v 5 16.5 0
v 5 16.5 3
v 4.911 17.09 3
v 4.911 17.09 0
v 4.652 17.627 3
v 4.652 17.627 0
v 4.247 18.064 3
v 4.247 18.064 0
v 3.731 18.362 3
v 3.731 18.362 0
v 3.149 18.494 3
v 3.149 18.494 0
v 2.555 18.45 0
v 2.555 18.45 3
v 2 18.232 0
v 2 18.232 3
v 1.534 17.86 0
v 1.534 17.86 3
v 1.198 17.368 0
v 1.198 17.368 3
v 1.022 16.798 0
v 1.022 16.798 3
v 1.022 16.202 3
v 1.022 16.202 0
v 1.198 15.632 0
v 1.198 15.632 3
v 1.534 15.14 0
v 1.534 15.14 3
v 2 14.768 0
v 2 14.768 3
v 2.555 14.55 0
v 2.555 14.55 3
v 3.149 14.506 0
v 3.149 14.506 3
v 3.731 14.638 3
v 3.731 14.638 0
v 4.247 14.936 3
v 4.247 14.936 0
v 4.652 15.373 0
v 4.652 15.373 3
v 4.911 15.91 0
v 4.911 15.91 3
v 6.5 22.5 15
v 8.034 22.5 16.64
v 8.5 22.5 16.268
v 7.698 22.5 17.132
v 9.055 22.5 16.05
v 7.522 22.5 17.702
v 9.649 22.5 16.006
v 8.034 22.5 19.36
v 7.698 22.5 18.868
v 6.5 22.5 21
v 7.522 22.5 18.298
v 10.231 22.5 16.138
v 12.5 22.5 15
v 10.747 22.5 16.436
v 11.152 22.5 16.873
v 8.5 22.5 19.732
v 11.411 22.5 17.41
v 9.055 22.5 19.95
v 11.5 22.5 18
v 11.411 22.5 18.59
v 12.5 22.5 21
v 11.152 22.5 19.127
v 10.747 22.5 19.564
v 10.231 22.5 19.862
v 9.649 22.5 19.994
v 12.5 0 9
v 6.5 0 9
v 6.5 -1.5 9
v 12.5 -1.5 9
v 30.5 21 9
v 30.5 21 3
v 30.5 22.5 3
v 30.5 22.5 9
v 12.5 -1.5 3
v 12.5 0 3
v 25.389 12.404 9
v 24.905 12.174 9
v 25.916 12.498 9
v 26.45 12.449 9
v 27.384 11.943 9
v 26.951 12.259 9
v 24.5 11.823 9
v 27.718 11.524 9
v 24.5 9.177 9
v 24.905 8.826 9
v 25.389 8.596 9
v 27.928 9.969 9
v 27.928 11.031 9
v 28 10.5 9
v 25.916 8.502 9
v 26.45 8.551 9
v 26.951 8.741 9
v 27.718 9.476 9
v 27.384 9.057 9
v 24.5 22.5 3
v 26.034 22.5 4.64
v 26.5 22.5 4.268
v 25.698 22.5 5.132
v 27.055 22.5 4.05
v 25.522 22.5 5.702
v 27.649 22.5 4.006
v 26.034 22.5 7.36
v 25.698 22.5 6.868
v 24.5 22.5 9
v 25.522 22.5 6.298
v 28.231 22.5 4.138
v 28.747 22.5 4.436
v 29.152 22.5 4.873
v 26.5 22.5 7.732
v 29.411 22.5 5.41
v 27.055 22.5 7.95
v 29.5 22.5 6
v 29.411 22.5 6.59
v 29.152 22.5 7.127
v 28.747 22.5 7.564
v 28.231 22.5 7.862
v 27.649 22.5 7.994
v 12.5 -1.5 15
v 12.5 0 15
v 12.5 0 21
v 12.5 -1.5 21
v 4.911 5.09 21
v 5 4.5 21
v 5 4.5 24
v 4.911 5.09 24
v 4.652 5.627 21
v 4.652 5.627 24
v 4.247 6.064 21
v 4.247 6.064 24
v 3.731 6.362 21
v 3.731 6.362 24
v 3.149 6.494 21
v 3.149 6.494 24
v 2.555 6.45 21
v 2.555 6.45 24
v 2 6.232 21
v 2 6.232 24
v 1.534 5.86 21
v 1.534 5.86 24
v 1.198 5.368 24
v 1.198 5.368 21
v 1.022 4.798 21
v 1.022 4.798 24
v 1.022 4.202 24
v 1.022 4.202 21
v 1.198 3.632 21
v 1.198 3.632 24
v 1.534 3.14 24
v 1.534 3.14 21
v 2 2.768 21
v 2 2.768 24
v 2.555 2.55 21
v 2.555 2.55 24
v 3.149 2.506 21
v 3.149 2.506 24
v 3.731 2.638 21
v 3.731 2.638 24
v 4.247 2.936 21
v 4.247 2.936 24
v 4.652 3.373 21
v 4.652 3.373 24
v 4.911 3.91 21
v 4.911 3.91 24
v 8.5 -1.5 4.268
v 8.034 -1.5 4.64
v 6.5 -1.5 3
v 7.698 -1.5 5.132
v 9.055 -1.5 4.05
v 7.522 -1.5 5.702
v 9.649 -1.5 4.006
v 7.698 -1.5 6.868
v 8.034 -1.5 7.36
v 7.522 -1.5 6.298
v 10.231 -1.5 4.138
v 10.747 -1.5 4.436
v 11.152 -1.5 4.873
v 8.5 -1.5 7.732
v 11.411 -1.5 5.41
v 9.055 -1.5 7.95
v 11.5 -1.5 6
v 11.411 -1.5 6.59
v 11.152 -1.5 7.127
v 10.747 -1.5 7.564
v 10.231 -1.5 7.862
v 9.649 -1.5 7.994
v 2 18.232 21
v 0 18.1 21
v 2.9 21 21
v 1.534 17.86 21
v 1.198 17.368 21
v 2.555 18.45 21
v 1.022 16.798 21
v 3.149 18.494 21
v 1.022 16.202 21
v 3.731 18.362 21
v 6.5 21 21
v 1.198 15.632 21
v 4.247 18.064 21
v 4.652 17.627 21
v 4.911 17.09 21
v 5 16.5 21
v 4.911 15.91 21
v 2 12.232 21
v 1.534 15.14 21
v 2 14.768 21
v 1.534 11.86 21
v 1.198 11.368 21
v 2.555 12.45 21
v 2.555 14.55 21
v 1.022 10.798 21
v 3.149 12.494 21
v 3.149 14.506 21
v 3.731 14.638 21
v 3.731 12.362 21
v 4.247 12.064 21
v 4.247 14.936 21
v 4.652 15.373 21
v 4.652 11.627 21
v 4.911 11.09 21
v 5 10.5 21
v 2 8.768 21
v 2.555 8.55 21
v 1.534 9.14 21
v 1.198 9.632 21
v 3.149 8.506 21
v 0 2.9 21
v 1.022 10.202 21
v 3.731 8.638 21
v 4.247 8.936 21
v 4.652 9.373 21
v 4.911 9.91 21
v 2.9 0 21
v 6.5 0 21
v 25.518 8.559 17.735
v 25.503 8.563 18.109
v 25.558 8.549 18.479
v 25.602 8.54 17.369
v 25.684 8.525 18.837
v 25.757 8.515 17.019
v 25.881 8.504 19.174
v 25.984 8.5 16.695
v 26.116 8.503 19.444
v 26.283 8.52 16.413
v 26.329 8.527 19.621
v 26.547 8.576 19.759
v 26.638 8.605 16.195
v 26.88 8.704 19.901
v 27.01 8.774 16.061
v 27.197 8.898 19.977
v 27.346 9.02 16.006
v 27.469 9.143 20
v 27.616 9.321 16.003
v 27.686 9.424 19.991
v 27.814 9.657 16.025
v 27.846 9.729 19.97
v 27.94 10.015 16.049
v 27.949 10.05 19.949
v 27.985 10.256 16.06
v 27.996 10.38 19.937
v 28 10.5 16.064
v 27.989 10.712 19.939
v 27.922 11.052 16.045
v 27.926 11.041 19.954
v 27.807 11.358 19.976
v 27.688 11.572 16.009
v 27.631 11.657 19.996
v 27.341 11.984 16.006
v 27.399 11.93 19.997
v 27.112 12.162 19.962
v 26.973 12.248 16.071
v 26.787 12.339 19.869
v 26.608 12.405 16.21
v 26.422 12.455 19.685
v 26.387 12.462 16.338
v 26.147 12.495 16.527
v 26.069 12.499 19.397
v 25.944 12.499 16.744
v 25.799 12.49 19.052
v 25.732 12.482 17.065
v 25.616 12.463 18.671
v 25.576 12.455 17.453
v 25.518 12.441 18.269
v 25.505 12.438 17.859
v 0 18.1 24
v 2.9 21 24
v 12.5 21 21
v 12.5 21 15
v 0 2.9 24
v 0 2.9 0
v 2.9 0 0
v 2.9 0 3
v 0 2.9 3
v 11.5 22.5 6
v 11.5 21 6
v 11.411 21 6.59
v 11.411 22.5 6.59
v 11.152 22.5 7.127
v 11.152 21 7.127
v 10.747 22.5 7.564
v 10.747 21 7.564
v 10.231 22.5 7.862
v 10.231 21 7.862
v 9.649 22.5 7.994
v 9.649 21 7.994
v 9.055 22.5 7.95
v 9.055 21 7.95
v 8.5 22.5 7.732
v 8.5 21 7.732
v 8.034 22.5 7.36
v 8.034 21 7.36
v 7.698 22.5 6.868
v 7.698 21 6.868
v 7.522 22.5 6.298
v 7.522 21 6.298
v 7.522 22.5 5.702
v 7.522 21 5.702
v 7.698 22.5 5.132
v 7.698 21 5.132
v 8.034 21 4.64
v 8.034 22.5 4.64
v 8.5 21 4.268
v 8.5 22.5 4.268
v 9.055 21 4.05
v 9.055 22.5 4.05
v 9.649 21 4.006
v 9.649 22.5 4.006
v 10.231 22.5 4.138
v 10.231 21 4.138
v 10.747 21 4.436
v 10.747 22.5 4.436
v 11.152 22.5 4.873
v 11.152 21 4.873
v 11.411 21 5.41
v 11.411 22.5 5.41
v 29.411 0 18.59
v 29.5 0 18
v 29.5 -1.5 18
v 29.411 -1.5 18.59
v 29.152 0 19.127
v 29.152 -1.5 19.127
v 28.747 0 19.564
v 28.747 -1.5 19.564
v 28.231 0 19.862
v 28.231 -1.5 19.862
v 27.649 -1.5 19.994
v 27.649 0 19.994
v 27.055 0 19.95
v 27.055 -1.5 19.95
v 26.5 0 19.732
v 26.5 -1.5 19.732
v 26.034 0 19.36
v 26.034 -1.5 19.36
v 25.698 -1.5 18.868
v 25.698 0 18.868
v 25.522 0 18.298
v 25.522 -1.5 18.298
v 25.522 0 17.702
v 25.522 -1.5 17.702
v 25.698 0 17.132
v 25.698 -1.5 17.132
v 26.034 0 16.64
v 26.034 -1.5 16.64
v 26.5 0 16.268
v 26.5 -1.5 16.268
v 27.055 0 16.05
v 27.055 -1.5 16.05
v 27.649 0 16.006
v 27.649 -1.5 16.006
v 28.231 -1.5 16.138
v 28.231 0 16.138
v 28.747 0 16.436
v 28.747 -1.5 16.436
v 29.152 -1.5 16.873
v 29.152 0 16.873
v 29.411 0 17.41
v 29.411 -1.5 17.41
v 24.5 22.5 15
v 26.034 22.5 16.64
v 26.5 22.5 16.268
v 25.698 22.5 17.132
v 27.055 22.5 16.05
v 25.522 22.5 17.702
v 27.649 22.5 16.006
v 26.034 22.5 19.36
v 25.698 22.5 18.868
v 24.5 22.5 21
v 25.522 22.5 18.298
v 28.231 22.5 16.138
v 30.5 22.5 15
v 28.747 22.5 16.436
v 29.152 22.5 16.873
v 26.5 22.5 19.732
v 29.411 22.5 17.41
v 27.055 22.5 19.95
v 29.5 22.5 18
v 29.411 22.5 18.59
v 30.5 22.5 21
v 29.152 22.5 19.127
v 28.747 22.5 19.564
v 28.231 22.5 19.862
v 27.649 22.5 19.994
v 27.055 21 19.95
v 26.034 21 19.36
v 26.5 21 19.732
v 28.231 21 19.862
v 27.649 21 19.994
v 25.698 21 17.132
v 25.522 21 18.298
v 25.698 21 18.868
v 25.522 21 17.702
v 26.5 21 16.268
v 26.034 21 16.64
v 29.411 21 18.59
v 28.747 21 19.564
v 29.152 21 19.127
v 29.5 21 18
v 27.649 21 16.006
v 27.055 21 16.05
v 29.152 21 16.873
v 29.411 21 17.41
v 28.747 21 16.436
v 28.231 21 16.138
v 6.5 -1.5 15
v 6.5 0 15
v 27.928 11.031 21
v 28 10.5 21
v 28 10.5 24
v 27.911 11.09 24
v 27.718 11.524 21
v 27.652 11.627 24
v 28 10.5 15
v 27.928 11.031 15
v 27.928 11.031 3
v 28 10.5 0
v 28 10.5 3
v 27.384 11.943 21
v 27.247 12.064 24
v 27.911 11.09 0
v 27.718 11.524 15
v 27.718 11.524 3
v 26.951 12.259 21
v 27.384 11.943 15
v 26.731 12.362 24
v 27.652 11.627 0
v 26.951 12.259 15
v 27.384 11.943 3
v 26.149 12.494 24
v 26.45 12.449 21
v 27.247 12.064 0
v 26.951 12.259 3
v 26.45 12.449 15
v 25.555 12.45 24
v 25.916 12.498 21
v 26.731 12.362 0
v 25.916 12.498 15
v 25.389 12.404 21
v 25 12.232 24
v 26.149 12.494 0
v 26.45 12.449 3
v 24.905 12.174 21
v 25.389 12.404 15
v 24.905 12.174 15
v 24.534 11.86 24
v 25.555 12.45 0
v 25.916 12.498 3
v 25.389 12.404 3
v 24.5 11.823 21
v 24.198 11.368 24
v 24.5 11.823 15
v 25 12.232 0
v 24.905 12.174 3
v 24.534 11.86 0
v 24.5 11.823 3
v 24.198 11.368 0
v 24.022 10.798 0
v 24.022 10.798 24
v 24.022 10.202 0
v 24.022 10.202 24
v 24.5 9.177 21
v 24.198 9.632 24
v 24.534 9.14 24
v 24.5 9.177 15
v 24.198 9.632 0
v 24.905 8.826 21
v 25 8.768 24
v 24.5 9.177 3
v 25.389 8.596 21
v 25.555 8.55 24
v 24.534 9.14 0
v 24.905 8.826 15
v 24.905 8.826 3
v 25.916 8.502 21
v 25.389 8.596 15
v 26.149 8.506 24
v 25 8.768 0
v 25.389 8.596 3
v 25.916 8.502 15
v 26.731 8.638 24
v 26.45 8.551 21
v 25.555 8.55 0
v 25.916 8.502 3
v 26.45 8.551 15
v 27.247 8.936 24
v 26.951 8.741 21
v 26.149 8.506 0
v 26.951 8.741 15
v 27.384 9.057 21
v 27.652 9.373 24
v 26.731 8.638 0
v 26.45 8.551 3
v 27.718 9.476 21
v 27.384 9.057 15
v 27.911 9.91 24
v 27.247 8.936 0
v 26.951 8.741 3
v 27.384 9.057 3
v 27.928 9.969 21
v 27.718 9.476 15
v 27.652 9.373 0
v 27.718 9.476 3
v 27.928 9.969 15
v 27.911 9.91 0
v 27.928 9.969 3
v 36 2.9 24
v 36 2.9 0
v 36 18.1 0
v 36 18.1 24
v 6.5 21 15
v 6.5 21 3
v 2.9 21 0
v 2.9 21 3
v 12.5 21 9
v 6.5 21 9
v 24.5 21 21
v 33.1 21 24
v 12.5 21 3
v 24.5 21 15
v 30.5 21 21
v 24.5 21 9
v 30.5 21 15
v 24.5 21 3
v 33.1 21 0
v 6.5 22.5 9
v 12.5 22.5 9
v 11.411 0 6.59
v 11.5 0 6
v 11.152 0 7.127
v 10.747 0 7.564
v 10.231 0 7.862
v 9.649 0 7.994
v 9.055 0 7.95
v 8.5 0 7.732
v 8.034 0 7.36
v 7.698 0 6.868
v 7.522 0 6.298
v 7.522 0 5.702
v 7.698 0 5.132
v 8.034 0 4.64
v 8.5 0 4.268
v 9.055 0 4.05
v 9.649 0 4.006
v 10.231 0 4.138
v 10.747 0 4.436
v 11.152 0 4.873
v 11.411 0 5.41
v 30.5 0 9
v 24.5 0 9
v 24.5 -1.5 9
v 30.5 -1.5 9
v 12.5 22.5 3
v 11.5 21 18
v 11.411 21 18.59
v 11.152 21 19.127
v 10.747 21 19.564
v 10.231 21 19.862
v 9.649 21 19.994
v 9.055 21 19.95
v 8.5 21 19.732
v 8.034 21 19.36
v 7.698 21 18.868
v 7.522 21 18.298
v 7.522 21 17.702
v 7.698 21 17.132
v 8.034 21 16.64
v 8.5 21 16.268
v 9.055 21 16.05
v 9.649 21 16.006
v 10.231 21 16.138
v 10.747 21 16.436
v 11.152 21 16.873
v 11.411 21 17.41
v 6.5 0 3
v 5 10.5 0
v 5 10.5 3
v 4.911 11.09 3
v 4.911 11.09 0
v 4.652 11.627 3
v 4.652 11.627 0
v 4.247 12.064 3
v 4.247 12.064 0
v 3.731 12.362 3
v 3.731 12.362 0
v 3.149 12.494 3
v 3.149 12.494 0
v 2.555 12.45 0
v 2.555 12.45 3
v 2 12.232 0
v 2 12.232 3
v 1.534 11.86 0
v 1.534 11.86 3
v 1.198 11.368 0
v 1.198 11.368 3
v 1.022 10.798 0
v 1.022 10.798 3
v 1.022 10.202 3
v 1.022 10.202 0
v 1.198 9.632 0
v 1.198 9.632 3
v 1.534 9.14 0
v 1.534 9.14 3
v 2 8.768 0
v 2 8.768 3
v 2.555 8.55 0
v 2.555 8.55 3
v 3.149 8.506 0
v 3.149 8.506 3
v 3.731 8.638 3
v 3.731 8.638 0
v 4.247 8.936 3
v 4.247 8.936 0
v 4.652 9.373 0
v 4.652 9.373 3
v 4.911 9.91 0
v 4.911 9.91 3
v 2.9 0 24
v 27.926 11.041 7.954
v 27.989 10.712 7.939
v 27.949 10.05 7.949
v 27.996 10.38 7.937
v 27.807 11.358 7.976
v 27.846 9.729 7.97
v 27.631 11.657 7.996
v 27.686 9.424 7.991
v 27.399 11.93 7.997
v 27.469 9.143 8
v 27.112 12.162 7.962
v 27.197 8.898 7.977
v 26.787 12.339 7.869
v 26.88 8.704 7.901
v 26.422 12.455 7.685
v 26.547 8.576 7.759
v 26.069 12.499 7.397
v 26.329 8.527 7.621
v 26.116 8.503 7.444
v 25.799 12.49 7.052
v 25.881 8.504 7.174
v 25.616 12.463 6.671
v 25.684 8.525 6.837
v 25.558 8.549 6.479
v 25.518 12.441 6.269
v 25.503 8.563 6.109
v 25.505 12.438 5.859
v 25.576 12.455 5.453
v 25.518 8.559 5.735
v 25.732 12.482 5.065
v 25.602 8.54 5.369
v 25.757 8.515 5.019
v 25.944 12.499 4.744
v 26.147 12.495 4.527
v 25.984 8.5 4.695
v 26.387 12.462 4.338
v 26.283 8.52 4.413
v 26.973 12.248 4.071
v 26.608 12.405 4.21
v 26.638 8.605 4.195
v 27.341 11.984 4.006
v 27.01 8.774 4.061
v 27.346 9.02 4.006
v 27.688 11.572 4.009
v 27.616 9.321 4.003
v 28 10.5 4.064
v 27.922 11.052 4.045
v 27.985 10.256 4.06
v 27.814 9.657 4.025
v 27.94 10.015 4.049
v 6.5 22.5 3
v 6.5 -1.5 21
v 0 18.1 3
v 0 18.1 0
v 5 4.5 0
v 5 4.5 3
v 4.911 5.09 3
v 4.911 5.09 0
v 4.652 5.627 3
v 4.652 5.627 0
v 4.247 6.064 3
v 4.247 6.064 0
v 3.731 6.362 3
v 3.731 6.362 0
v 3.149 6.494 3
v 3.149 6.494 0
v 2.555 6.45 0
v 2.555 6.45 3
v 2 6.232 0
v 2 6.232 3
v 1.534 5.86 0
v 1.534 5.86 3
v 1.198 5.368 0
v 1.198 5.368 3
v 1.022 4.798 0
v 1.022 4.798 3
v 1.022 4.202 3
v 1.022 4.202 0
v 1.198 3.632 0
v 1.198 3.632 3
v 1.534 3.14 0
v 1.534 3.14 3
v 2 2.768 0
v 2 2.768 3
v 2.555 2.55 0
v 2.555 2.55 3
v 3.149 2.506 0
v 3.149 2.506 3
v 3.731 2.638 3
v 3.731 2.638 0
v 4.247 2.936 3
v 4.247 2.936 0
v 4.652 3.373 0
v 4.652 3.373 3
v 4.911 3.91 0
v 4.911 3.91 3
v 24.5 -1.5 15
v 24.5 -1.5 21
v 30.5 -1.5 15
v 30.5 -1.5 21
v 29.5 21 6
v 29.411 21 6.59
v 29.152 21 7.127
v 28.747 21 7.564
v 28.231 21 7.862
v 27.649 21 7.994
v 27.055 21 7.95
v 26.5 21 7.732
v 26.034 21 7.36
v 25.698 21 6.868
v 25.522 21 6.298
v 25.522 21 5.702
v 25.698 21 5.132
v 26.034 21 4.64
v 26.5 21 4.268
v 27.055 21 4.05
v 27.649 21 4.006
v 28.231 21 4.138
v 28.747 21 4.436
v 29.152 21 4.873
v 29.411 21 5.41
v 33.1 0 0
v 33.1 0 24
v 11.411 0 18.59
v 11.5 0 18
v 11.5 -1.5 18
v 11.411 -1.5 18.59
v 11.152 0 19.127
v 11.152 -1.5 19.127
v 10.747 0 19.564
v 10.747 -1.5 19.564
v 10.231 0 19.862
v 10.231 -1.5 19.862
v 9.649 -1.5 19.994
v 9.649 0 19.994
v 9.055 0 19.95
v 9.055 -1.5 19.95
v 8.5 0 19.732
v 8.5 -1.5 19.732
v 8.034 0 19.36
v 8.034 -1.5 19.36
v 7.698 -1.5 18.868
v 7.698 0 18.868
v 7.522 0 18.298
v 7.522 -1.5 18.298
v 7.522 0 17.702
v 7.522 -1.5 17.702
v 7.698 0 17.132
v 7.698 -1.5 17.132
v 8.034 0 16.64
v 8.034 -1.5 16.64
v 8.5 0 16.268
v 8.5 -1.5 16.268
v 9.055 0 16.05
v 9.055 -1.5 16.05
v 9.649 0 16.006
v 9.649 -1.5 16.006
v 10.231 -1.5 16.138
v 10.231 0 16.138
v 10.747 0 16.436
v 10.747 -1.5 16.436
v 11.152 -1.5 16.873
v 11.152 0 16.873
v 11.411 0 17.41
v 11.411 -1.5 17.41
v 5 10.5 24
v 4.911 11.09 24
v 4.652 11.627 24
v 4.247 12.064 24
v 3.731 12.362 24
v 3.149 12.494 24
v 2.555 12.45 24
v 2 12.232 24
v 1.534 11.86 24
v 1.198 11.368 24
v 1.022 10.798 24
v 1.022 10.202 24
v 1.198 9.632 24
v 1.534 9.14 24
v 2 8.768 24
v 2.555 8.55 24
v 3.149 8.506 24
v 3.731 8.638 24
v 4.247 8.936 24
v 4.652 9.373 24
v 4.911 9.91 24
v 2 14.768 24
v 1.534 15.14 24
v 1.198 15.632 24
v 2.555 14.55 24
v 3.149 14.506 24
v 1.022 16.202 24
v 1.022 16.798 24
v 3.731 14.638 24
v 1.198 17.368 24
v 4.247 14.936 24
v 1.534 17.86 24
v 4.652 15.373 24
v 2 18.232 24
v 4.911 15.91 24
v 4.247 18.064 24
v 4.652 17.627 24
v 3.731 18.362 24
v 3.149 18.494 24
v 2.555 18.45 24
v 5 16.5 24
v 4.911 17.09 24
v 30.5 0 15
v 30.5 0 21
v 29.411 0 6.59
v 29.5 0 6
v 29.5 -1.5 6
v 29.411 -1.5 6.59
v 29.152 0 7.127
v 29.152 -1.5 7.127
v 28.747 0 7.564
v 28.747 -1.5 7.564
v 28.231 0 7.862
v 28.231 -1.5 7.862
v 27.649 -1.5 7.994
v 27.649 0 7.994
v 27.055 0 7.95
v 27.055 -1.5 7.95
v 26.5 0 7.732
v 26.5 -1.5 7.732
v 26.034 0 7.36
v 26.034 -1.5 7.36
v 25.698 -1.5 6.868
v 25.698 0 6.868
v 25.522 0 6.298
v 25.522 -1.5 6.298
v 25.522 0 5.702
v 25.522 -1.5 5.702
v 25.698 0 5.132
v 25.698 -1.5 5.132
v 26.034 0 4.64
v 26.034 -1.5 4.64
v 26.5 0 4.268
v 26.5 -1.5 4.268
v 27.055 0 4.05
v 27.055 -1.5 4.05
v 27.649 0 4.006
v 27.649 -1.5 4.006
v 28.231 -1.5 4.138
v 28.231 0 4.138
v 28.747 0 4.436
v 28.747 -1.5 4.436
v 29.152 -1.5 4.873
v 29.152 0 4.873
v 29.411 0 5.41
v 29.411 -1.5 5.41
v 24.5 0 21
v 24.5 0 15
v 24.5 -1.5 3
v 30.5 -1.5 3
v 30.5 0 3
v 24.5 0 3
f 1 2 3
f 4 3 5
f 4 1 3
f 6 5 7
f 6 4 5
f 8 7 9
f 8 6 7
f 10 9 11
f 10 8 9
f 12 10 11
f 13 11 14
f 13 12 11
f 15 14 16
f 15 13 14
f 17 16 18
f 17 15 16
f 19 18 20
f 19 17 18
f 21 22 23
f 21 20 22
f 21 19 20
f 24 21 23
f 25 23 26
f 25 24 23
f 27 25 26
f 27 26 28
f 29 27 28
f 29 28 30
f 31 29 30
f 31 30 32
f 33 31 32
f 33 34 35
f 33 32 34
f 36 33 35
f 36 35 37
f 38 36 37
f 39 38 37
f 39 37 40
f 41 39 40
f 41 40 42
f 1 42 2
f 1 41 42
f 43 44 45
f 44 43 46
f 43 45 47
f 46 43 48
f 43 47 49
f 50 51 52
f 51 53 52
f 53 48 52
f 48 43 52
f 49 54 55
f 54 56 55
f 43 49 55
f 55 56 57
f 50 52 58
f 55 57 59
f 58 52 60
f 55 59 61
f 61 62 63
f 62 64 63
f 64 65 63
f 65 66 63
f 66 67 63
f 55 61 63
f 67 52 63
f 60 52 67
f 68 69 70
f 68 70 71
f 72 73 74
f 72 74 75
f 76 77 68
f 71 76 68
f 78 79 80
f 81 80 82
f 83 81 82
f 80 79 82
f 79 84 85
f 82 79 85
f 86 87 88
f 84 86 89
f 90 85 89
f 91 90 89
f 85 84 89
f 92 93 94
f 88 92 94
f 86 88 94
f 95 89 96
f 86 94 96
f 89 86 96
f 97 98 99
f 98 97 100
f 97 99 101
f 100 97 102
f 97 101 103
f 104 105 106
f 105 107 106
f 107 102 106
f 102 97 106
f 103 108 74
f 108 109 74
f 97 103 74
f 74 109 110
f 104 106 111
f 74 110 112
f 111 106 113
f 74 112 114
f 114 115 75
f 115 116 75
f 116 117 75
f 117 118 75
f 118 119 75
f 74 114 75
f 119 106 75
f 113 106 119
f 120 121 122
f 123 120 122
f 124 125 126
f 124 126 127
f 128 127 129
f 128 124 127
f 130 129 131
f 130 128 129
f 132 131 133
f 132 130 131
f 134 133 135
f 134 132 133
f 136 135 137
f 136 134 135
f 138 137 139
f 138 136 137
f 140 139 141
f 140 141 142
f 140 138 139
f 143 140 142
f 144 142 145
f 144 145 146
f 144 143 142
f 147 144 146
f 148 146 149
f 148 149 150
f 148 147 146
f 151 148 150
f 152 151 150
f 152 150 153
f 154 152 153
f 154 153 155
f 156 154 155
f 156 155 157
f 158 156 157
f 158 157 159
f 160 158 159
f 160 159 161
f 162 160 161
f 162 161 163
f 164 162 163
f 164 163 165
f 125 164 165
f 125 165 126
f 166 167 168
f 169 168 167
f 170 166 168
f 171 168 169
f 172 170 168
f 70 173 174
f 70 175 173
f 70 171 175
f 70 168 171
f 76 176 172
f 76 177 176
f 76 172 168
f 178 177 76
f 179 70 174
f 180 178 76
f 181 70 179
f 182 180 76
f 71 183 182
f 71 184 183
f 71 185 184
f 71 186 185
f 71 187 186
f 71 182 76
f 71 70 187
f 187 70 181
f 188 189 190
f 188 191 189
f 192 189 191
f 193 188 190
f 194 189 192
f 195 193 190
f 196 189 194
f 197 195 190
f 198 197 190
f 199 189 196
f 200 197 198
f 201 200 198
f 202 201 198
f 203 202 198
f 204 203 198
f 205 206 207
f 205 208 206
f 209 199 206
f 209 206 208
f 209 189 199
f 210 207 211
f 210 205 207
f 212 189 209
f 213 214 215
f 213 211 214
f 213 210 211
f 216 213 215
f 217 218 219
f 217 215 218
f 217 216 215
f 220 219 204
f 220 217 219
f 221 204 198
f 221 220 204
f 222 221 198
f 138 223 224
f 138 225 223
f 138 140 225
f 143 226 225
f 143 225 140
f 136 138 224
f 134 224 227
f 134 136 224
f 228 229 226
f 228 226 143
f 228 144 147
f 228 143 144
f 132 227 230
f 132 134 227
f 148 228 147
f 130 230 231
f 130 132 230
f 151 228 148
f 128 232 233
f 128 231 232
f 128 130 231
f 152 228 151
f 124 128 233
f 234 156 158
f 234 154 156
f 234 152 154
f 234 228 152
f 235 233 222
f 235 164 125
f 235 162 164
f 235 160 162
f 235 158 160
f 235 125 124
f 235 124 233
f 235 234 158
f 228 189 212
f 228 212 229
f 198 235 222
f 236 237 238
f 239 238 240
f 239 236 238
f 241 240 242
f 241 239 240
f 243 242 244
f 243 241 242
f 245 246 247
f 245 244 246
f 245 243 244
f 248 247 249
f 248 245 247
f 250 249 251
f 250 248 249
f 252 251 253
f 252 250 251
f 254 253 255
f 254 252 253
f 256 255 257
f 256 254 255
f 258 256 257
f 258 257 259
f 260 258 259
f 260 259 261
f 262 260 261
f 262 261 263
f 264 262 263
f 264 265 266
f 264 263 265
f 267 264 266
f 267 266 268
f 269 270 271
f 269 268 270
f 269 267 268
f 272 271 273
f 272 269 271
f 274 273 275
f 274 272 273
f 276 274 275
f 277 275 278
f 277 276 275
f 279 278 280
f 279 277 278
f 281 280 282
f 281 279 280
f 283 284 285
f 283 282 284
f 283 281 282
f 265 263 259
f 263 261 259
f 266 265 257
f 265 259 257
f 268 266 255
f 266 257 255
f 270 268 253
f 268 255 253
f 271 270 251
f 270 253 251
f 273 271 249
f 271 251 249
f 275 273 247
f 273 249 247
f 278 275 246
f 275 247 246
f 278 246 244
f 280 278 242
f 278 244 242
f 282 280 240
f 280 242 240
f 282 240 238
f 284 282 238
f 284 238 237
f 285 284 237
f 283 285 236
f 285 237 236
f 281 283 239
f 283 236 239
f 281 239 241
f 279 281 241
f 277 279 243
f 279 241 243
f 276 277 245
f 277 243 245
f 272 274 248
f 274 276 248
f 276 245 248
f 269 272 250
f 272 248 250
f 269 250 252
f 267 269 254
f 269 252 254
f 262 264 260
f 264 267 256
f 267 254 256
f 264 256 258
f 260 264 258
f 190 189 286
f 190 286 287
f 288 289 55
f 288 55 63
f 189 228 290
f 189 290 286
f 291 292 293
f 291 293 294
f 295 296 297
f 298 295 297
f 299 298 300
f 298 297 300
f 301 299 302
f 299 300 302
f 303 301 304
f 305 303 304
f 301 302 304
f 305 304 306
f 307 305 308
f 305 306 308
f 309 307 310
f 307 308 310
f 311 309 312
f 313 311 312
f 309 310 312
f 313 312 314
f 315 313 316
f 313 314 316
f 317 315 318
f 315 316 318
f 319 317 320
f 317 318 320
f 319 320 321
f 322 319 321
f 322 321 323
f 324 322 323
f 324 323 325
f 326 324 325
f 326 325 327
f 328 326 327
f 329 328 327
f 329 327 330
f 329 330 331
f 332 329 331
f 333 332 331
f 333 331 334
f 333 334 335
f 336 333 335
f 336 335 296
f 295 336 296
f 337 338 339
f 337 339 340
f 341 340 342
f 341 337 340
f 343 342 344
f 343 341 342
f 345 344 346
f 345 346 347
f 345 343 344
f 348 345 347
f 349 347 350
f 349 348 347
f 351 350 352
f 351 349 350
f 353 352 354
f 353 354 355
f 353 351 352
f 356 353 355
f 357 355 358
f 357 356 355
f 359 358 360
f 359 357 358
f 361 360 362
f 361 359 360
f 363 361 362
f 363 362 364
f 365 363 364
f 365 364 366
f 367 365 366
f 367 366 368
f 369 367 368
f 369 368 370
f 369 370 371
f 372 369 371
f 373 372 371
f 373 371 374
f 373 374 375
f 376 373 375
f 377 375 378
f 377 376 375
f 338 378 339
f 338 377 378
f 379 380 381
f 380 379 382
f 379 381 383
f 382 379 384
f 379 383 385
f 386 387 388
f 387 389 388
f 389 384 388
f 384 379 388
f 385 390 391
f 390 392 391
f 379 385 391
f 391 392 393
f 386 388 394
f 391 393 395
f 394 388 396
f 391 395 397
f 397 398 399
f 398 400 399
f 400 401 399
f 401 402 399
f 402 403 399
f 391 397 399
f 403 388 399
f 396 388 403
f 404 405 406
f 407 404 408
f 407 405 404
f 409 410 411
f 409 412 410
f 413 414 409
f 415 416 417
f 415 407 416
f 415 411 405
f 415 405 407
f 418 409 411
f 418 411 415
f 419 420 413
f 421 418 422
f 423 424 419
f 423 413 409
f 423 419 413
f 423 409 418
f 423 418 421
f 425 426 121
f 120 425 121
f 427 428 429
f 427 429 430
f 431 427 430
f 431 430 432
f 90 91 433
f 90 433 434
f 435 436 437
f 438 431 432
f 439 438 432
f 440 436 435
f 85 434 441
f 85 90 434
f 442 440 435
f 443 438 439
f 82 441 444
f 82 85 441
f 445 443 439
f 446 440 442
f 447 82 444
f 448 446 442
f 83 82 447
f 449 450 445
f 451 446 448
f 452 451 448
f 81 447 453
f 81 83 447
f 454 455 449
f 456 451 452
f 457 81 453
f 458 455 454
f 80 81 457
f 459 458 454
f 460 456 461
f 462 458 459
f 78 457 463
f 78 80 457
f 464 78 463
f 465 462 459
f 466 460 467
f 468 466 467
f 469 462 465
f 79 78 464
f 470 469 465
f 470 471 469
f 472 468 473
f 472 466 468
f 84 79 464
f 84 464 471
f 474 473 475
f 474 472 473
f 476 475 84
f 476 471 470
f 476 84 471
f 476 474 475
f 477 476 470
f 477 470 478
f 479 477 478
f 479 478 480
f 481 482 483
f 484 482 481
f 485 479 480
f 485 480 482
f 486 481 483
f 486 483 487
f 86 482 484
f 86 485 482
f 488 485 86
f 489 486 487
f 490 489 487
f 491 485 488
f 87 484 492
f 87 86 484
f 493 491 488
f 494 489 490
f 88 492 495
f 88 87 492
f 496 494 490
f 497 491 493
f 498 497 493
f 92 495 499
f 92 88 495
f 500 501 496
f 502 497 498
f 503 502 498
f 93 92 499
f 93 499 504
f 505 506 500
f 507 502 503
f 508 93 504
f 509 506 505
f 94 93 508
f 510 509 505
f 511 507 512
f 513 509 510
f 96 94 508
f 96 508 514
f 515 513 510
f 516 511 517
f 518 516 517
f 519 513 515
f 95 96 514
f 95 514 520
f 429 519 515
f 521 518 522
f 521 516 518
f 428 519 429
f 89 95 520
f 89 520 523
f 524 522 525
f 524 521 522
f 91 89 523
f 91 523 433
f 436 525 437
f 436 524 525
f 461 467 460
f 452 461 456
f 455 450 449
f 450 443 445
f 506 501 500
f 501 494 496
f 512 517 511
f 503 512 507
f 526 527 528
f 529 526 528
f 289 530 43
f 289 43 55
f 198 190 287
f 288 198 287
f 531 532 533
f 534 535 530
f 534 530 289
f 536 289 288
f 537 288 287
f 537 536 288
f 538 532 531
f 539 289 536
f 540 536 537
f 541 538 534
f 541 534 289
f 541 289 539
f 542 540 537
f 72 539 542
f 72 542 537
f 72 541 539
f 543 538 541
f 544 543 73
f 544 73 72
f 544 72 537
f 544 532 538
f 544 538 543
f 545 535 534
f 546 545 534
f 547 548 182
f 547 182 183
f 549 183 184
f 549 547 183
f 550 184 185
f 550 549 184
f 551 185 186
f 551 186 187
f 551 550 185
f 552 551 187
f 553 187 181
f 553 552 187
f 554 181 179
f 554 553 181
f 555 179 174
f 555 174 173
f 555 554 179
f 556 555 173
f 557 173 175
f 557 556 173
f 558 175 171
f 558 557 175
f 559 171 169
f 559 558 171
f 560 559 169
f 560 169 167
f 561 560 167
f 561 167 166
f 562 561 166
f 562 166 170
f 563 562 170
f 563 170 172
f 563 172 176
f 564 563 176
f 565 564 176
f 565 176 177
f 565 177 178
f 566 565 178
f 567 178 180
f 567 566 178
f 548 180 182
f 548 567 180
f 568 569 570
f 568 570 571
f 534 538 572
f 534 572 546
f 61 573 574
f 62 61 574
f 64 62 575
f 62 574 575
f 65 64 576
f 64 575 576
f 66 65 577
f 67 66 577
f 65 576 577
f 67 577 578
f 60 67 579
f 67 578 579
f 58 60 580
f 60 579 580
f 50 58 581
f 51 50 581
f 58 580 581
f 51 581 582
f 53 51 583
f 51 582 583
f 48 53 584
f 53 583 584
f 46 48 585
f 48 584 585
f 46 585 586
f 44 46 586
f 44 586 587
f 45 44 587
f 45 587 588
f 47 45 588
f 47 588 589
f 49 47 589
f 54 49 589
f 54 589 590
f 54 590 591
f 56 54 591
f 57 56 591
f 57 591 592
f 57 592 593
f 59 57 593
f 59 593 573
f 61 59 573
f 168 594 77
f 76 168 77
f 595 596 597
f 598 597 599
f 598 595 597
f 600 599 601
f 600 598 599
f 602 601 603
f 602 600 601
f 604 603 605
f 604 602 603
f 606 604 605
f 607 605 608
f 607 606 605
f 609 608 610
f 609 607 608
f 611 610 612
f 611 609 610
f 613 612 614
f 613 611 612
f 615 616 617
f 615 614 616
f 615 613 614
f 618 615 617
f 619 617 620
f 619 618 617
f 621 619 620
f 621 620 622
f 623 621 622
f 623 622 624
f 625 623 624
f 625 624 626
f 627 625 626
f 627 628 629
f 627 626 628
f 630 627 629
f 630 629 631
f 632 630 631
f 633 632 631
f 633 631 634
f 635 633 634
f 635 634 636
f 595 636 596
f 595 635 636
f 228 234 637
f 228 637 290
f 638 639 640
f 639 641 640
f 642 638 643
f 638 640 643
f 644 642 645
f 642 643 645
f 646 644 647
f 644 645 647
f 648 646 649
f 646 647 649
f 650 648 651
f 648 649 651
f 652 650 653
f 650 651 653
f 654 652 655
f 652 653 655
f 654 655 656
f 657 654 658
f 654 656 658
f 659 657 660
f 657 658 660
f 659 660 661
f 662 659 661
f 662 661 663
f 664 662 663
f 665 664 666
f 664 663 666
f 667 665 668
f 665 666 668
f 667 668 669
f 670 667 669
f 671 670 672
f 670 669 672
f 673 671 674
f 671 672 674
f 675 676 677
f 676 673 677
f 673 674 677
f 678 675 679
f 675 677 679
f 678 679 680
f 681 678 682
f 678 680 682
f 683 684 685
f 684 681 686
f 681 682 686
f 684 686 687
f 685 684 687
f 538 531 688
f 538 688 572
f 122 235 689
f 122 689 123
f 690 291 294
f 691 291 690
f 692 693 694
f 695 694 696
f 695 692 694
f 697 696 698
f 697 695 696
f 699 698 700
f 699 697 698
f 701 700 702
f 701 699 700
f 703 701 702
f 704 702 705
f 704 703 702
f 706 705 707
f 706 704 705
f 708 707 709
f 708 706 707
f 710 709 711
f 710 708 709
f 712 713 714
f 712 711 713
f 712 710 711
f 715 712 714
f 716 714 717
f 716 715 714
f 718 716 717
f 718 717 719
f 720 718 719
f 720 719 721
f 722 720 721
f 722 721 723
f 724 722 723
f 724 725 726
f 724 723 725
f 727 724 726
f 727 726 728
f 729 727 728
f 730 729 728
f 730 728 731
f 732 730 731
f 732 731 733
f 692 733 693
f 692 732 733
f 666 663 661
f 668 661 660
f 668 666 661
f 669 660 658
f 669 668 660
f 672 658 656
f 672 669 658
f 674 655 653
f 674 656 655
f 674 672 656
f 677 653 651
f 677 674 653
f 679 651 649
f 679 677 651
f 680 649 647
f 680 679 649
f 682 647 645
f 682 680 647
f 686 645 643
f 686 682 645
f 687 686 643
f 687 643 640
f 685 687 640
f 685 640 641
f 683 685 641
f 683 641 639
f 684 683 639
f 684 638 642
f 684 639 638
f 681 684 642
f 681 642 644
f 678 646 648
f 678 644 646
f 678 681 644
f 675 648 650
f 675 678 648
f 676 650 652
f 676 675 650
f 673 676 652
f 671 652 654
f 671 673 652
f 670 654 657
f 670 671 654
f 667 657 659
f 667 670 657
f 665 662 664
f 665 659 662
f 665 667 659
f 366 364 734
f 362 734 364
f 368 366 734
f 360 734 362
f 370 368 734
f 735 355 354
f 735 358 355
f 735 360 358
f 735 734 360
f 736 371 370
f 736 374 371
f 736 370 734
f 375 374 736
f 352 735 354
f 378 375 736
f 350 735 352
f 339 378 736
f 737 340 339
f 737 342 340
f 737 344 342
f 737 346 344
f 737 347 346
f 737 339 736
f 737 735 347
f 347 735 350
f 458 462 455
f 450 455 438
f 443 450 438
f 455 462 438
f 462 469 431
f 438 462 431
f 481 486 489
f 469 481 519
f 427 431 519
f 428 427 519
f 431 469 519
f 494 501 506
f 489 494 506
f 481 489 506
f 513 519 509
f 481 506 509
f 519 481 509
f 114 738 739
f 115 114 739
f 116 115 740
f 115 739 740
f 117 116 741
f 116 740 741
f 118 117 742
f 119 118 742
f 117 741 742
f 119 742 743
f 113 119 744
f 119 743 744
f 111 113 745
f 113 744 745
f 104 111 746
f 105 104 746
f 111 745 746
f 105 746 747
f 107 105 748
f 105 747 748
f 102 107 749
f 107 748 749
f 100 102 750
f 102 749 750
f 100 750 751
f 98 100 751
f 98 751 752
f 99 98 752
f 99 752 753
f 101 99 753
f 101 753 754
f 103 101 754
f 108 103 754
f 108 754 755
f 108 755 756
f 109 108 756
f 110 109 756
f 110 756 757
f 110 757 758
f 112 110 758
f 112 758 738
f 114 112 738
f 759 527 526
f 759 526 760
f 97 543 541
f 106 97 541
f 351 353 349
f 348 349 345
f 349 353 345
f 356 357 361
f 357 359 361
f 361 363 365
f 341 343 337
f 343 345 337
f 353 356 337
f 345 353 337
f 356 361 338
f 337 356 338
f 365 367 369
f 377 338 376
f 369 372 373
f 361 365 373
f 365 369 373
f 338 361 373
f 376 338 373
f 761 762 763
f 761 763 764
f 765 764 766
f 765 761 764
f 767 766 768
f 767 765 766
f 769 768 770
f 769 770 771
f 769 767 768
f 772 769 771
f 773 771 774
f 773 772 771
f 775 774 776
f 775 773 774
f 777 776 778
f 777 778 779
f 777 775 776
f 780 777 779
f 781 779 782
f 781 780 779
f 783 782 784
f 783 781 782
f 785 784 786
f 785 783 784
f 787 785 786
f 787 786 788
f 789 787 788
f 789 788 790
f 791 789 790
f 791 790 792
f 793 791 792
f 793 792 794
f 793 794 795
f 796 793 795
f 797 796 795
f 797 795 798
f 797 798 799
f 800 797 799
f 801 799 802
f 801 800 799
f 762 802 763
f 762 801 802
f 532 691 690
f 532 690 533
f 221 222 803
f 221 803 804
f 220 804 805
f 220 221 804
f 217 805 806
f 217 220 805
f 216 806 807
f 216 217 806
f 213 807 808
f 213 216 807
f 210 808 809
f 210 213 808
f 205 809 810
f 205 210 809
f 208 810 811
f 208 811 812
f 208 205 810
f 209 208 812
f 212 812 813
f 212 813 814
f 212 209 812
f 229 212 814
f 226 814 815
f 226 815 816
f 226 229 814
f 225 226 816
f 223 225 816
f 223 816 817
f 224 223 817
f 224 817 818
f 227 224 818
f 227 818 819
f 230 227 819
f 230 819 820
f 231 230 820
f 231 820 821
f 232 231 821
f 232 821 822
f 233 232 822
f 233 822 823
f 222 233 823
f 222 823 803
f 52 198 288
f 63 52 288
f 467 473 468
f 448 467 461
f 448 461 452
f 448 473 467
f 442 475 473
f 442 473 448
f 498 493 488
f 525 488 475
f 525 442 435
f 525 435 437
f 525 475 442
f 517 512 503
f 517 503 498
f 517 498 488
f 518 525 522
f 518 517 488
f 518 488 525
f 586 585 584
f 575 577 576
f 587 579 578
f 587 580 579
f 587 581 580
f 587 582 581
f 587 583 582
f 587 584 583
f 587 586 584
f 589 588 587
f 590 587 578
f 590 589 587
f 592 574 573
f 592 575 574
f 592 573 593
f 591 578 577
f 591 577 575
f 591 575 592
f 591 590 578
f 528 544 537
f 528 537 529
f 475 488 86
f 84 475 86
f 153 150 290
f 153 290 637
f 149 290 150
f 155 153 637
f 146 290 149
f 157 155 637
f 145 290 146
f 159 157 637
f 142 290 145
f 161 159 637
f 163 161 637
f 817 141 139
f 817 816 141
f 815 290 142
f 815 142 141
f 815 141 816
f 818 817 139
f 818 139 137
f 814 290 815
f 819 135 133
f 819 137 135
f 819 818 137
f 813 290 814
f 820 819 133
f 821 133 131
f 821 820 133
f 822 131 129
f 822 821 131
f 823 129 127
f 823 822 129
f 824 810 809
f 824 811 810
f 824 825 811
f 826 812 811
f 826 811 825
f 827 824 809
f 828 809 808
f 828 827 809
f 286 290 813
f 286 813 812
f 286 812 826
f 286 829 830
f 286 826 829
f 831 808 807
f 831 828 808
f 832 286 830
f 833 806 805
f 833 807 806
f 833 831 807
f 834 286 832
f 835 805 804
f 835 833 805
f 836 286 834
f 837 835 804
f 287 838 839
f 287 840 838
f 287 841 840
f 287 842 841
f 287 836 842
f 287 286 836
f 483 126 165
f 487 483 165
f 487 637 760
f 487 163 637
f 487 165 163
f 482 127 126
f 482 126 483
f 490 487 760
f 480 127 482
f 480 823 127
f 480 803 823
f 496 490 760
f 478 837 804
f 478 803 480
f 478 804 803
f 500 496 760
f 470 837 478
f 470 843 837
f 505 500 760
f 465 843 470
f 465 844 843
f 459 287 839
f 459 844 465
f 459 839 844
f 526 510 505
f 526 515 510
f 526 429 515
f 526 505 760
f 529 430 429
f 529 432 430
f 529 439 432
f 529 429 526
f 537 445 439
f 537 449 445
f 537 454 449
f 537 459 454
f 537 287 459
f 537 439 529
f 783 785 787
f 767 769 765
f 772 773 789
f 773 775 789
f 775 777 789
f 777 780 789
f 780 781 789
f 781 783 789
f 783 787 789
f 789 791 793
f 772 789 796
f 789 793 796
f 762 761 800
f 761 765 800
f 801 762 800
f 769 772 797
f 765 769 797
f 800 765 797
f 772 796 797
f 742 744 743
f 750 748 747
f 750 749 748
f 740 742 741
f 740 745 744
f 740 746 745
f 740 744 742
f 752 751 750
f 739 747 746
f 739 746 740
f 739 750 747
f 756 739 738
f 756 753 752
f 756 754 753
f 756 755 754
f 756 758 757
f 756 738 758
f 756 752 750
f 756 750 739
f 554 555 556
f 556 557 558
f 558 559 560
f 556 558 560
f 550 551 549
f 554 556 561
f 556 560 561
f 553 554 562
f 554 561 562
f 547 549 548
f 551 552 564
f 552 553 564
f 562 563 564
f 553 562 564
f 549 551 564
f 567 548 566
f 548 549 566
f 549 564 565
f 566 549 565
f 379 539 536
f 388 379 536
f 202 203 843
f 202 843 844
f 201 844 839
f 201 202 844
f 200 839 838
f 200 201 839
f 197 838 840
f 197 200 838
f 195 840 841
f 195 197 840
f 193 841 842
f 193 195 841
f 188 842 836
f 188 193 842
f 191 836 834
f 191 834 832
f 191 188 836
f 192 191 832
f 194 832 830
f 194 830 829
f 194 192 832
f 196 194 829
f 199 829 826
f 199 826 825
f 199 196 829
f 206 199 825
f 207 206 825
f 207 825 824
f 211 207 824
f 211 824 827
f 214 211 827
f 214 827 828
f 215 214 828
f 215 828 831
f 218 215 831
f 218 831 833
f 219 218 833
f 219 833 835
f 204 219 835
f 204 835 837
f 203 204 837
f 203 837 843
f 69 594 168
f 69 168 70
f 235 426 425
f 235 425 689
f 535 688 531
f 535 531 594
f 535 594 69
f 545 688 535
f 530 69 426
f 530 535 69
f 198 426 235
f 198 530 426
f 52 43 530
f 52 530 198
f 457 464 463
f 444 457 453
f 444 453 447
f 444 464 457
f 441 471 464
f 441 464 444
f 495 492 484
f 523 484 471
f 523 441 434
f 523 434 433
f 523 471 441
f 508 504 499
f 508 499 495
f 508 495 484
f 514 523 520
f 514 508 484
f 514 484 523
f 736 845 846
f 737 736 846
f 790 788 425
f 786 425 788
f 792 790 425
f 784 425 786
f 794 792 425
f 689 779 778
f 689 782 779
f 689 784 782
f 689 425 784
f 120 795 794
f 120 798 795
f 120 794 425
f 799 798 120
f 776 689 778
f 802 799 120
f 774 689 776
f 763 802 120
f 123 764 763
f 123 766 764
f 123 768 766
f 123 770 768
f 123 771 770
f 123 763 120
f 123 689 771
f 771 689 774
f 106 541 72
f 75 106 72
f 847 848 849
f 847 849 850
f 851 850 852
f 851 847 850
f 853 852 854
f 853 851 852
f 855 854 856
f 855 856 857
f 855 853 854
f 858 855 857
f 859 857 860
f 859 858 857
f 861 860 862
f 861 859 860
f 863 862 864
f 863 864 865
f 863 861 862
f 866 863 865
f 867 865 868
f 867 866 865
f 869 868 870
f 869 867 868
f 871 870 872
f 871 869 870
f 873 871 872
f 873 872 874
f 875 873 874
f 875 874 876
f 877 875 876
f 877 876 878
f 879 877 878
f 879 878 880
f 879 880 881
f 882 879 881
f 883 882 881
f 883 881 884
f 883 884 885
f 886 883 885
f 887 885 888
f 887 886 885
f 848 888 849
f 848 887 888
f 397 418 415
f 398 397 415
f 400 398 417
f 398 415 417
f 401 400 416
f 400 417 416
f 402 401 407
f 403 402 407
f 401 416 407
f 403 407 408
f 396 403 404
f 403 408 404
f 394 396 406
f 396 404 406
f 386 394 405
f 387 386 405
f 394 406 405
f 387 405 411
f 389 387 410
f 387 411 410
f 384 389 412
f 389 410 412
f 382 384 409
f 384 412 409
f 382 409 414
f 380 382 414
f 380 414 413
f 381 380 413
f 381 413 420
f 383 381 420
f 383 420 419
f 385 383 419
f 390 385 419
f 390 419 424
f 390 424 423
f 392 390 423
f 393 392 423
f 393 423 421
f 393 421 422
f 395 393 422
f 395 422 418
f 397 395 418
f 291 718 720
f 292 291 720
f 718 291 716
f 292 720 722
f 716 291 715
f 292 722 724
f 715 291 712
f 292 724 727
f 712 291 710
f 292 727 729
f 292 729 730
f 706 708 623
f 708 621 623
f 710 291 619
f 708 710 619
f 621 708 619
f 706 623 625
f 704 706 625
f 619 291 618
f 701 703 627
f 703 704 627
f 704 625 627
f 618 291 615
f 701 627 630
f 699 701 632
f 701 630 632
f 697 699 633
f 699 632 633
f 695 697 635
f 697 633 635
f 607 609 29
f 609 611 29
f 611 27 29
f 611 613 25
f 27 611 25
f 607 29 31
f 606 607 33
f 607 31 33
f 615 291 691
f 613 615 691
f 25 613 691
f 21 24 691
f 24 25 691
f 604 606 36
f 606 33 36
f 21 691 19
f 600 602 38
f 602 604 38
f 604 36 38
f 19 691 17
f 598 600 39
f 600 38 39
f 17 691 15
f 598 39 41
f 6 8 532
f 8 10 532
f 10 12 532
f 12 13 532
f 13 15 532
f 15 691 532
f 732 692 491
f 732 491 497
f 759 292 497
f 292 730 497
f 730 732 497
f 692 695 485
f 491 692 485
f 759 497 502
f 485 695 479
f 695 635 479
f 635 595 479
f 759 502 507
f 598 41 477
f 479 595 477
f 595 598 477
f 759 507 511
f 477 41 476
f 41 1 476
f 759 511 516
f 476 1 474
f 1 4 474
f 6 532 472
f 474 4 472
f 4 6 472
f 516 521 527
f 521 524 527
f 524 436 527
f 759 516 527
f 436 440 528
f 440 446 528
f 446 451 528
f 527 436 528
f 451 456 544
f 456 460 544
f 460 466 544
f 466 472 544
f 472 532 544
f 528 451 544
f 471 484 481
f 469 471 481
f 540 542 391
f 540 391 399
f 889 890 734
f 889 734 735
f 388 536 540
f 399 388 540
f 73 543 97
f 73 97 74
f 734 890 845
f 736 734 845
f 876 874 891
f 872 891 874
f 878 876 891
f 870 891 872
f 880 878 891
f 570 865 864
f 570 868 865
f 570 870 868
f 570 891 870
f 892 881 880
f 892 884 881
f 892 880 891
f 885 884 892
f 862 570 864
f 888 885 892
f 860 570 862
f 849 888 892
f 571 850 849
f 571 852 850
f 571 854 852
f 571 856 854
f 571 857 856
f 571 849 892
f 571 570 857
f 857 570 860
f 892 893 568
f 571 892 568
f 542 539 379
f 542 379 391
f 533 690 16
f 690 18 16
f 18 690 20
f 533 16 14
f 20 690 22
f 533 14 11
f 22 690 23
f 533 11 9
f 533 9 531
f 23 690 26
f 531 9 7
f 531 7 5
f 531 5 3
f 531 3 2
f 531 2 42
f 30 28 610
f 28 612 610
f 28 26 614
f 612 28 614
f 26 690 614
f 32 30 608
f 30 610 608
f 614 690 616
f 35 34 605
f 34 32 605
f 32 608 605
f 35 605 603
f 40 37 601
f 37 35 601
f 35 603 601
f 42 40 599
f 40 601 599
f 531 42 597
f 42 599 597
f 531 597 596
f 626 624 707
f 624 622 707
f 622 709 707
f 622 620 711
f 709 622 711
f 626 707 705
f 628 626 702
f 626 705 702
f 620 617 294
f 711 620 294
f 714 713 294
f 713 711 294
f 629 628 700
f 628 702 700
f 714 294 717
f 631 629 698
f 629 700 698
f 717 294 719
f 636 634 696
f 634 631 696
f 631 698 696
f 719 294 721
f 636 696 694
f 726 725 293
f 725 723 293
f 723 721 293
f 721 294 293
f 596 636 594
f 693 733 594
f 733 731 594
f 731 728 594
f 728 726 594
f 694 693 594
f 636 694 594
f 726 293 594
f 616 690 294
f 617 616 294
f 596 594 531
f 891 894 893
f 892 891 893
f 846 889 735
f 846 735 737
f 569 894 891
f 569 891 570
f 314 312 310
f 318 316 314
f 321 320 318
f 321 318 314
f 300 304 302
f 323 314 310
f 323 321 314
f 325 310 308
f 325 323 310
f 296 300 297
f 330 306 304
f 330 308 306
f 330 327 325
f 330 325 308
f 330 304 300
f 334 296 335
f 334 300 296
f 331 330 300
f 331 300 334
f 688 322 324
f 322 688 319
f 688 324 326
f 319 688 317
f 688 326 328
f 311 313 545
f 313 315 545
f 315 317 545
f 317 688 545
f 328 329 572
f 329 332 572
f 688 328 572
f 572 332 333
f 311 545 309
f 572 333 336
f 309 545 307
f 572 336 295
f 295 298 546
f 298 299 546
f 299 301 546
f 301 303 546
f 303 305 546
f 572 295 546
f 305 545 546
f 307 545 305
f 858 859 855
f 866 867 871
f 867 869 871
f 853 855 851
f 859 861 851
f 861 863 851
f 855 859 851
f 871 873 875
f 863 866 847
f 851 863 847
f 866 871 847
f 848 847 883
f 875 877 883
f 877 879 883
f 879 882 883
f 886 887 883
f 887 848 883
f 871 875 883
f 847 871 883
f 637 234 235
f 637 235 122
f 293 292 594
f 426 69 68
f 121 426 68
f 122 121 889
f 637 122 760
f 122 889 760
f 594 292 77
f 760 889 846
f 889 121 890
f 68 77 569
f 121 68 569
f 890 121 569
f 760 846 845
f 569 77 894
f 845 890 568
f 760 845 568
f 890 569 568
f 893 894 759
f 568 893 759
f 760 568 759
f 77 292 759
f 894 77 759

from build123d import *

# Parameters (mm, degrees)
SKETCH_W          = 36
SKETCH_H          = 21
SKETCH_R          = 2
PAD_DEPTH         = 24
SKETCH001_W       = 6.5
SKETCH001_H       = 18
POCKET_DEPTH      = 21
POCKET001_DEPTH   = 24
SKETCH003_W       = 6
SKETCH003_H       = 6
SKETCH003_R       = 2
PAD001_DEPTH      = 1.5
PAD001_DEPTH_BACK = 22.5


with BuildPart() as part:
    # Sketch → Pad (new body)
    with BuildSketch(Plane.XY):
        with Locations((18, 10.5)):
            Rectangle(SKETCH_W, SKETCH_H)
        with Locations((3, 16.5)):
            Circle(SKETCH_R, mode=Mode.SUBTRACT)
        with Locations((3, 10.5)):
            Circle(SKETCH_R, mode=Mode.SUBTRACT)
        with Locations((3, 4.5)):
            Circle(SKETCH_R, mode=Mode.SUBTRACT)
        with Locations((26, 10.5)):
            Circle(SKETCH_R, mode=Mode.SUBTRACT)
    extrude(amount=PAD_DEPTH)

    # Sketch001 → Pocket (cut)
    with BuildSketch(Plane.XZ):
        with Locations((3.25, 12)):
            Rectangle(SKETCH001_W, SKETCH001_H)
    extrude(amount=-POCKET_DEPTH, mode=Mode.SUBTRACT)

    # Sketch002 → Pocket001 (cut)
    with BuildSketch(Plane(origin=(0, 0, 0), x_dir=(1, 0, 0), z_dir=(0, 0, -1))):
        Polygon((0, -18.1), (2.9, -21), (0, -21), align=None)
        Polygon((33.1, -21), (36, -18.1), (36, -21), align=None)
        Polygon((36, -2.9), (33.1, 0), (36, 0), align=None)
        Polygon((2.9, 0), (0, -2.9), (0, 0), align=None)
    extrude(amount=-POCKET001_DEPTH, mode=Mode.SUBTRACT)

    # Sketch003 → Pad001 (new body, two sides)
    with BuildSketch(Plane.XZ) as pad001_sk:
        with Locations((9.5, 18)):
            Rectangle(SKETCH003_W, SKETCH003_H)
        with Locations((9.5, 18)):
            Circle(SKETCH003_R, mode=Mode.SUBTRACT)
        with Locations((9.5, 6)):
            Rectangle(SKETCH003_W, SKETCH003_H)
        with Locations((9.5, 6)):
            Circle(SKETCH003_R, mode=Mode.SUBTRACT)
        with Locations((27.5, 18)):
            Rectangle(SKETCH003_W, SKETCH003_H)
        with Locations((27.5, 18)):
            Circle(SKETCH003_R, mode=Mode.SUBTRACT)
        with Locations((27.5, 6)):
            Rectangle(SKETCH003_W, SKETCH003_H)
        with Locations((27.5, 6)):
            Circle(SKETCH003_R, mode=Mode.SUBTRACT)
    extrude(amount=PAD001_DEPTH)
    extrude(pad001_sk.sketch, amount=-PAD001_DEPTH_BACK)


solid = part.part
